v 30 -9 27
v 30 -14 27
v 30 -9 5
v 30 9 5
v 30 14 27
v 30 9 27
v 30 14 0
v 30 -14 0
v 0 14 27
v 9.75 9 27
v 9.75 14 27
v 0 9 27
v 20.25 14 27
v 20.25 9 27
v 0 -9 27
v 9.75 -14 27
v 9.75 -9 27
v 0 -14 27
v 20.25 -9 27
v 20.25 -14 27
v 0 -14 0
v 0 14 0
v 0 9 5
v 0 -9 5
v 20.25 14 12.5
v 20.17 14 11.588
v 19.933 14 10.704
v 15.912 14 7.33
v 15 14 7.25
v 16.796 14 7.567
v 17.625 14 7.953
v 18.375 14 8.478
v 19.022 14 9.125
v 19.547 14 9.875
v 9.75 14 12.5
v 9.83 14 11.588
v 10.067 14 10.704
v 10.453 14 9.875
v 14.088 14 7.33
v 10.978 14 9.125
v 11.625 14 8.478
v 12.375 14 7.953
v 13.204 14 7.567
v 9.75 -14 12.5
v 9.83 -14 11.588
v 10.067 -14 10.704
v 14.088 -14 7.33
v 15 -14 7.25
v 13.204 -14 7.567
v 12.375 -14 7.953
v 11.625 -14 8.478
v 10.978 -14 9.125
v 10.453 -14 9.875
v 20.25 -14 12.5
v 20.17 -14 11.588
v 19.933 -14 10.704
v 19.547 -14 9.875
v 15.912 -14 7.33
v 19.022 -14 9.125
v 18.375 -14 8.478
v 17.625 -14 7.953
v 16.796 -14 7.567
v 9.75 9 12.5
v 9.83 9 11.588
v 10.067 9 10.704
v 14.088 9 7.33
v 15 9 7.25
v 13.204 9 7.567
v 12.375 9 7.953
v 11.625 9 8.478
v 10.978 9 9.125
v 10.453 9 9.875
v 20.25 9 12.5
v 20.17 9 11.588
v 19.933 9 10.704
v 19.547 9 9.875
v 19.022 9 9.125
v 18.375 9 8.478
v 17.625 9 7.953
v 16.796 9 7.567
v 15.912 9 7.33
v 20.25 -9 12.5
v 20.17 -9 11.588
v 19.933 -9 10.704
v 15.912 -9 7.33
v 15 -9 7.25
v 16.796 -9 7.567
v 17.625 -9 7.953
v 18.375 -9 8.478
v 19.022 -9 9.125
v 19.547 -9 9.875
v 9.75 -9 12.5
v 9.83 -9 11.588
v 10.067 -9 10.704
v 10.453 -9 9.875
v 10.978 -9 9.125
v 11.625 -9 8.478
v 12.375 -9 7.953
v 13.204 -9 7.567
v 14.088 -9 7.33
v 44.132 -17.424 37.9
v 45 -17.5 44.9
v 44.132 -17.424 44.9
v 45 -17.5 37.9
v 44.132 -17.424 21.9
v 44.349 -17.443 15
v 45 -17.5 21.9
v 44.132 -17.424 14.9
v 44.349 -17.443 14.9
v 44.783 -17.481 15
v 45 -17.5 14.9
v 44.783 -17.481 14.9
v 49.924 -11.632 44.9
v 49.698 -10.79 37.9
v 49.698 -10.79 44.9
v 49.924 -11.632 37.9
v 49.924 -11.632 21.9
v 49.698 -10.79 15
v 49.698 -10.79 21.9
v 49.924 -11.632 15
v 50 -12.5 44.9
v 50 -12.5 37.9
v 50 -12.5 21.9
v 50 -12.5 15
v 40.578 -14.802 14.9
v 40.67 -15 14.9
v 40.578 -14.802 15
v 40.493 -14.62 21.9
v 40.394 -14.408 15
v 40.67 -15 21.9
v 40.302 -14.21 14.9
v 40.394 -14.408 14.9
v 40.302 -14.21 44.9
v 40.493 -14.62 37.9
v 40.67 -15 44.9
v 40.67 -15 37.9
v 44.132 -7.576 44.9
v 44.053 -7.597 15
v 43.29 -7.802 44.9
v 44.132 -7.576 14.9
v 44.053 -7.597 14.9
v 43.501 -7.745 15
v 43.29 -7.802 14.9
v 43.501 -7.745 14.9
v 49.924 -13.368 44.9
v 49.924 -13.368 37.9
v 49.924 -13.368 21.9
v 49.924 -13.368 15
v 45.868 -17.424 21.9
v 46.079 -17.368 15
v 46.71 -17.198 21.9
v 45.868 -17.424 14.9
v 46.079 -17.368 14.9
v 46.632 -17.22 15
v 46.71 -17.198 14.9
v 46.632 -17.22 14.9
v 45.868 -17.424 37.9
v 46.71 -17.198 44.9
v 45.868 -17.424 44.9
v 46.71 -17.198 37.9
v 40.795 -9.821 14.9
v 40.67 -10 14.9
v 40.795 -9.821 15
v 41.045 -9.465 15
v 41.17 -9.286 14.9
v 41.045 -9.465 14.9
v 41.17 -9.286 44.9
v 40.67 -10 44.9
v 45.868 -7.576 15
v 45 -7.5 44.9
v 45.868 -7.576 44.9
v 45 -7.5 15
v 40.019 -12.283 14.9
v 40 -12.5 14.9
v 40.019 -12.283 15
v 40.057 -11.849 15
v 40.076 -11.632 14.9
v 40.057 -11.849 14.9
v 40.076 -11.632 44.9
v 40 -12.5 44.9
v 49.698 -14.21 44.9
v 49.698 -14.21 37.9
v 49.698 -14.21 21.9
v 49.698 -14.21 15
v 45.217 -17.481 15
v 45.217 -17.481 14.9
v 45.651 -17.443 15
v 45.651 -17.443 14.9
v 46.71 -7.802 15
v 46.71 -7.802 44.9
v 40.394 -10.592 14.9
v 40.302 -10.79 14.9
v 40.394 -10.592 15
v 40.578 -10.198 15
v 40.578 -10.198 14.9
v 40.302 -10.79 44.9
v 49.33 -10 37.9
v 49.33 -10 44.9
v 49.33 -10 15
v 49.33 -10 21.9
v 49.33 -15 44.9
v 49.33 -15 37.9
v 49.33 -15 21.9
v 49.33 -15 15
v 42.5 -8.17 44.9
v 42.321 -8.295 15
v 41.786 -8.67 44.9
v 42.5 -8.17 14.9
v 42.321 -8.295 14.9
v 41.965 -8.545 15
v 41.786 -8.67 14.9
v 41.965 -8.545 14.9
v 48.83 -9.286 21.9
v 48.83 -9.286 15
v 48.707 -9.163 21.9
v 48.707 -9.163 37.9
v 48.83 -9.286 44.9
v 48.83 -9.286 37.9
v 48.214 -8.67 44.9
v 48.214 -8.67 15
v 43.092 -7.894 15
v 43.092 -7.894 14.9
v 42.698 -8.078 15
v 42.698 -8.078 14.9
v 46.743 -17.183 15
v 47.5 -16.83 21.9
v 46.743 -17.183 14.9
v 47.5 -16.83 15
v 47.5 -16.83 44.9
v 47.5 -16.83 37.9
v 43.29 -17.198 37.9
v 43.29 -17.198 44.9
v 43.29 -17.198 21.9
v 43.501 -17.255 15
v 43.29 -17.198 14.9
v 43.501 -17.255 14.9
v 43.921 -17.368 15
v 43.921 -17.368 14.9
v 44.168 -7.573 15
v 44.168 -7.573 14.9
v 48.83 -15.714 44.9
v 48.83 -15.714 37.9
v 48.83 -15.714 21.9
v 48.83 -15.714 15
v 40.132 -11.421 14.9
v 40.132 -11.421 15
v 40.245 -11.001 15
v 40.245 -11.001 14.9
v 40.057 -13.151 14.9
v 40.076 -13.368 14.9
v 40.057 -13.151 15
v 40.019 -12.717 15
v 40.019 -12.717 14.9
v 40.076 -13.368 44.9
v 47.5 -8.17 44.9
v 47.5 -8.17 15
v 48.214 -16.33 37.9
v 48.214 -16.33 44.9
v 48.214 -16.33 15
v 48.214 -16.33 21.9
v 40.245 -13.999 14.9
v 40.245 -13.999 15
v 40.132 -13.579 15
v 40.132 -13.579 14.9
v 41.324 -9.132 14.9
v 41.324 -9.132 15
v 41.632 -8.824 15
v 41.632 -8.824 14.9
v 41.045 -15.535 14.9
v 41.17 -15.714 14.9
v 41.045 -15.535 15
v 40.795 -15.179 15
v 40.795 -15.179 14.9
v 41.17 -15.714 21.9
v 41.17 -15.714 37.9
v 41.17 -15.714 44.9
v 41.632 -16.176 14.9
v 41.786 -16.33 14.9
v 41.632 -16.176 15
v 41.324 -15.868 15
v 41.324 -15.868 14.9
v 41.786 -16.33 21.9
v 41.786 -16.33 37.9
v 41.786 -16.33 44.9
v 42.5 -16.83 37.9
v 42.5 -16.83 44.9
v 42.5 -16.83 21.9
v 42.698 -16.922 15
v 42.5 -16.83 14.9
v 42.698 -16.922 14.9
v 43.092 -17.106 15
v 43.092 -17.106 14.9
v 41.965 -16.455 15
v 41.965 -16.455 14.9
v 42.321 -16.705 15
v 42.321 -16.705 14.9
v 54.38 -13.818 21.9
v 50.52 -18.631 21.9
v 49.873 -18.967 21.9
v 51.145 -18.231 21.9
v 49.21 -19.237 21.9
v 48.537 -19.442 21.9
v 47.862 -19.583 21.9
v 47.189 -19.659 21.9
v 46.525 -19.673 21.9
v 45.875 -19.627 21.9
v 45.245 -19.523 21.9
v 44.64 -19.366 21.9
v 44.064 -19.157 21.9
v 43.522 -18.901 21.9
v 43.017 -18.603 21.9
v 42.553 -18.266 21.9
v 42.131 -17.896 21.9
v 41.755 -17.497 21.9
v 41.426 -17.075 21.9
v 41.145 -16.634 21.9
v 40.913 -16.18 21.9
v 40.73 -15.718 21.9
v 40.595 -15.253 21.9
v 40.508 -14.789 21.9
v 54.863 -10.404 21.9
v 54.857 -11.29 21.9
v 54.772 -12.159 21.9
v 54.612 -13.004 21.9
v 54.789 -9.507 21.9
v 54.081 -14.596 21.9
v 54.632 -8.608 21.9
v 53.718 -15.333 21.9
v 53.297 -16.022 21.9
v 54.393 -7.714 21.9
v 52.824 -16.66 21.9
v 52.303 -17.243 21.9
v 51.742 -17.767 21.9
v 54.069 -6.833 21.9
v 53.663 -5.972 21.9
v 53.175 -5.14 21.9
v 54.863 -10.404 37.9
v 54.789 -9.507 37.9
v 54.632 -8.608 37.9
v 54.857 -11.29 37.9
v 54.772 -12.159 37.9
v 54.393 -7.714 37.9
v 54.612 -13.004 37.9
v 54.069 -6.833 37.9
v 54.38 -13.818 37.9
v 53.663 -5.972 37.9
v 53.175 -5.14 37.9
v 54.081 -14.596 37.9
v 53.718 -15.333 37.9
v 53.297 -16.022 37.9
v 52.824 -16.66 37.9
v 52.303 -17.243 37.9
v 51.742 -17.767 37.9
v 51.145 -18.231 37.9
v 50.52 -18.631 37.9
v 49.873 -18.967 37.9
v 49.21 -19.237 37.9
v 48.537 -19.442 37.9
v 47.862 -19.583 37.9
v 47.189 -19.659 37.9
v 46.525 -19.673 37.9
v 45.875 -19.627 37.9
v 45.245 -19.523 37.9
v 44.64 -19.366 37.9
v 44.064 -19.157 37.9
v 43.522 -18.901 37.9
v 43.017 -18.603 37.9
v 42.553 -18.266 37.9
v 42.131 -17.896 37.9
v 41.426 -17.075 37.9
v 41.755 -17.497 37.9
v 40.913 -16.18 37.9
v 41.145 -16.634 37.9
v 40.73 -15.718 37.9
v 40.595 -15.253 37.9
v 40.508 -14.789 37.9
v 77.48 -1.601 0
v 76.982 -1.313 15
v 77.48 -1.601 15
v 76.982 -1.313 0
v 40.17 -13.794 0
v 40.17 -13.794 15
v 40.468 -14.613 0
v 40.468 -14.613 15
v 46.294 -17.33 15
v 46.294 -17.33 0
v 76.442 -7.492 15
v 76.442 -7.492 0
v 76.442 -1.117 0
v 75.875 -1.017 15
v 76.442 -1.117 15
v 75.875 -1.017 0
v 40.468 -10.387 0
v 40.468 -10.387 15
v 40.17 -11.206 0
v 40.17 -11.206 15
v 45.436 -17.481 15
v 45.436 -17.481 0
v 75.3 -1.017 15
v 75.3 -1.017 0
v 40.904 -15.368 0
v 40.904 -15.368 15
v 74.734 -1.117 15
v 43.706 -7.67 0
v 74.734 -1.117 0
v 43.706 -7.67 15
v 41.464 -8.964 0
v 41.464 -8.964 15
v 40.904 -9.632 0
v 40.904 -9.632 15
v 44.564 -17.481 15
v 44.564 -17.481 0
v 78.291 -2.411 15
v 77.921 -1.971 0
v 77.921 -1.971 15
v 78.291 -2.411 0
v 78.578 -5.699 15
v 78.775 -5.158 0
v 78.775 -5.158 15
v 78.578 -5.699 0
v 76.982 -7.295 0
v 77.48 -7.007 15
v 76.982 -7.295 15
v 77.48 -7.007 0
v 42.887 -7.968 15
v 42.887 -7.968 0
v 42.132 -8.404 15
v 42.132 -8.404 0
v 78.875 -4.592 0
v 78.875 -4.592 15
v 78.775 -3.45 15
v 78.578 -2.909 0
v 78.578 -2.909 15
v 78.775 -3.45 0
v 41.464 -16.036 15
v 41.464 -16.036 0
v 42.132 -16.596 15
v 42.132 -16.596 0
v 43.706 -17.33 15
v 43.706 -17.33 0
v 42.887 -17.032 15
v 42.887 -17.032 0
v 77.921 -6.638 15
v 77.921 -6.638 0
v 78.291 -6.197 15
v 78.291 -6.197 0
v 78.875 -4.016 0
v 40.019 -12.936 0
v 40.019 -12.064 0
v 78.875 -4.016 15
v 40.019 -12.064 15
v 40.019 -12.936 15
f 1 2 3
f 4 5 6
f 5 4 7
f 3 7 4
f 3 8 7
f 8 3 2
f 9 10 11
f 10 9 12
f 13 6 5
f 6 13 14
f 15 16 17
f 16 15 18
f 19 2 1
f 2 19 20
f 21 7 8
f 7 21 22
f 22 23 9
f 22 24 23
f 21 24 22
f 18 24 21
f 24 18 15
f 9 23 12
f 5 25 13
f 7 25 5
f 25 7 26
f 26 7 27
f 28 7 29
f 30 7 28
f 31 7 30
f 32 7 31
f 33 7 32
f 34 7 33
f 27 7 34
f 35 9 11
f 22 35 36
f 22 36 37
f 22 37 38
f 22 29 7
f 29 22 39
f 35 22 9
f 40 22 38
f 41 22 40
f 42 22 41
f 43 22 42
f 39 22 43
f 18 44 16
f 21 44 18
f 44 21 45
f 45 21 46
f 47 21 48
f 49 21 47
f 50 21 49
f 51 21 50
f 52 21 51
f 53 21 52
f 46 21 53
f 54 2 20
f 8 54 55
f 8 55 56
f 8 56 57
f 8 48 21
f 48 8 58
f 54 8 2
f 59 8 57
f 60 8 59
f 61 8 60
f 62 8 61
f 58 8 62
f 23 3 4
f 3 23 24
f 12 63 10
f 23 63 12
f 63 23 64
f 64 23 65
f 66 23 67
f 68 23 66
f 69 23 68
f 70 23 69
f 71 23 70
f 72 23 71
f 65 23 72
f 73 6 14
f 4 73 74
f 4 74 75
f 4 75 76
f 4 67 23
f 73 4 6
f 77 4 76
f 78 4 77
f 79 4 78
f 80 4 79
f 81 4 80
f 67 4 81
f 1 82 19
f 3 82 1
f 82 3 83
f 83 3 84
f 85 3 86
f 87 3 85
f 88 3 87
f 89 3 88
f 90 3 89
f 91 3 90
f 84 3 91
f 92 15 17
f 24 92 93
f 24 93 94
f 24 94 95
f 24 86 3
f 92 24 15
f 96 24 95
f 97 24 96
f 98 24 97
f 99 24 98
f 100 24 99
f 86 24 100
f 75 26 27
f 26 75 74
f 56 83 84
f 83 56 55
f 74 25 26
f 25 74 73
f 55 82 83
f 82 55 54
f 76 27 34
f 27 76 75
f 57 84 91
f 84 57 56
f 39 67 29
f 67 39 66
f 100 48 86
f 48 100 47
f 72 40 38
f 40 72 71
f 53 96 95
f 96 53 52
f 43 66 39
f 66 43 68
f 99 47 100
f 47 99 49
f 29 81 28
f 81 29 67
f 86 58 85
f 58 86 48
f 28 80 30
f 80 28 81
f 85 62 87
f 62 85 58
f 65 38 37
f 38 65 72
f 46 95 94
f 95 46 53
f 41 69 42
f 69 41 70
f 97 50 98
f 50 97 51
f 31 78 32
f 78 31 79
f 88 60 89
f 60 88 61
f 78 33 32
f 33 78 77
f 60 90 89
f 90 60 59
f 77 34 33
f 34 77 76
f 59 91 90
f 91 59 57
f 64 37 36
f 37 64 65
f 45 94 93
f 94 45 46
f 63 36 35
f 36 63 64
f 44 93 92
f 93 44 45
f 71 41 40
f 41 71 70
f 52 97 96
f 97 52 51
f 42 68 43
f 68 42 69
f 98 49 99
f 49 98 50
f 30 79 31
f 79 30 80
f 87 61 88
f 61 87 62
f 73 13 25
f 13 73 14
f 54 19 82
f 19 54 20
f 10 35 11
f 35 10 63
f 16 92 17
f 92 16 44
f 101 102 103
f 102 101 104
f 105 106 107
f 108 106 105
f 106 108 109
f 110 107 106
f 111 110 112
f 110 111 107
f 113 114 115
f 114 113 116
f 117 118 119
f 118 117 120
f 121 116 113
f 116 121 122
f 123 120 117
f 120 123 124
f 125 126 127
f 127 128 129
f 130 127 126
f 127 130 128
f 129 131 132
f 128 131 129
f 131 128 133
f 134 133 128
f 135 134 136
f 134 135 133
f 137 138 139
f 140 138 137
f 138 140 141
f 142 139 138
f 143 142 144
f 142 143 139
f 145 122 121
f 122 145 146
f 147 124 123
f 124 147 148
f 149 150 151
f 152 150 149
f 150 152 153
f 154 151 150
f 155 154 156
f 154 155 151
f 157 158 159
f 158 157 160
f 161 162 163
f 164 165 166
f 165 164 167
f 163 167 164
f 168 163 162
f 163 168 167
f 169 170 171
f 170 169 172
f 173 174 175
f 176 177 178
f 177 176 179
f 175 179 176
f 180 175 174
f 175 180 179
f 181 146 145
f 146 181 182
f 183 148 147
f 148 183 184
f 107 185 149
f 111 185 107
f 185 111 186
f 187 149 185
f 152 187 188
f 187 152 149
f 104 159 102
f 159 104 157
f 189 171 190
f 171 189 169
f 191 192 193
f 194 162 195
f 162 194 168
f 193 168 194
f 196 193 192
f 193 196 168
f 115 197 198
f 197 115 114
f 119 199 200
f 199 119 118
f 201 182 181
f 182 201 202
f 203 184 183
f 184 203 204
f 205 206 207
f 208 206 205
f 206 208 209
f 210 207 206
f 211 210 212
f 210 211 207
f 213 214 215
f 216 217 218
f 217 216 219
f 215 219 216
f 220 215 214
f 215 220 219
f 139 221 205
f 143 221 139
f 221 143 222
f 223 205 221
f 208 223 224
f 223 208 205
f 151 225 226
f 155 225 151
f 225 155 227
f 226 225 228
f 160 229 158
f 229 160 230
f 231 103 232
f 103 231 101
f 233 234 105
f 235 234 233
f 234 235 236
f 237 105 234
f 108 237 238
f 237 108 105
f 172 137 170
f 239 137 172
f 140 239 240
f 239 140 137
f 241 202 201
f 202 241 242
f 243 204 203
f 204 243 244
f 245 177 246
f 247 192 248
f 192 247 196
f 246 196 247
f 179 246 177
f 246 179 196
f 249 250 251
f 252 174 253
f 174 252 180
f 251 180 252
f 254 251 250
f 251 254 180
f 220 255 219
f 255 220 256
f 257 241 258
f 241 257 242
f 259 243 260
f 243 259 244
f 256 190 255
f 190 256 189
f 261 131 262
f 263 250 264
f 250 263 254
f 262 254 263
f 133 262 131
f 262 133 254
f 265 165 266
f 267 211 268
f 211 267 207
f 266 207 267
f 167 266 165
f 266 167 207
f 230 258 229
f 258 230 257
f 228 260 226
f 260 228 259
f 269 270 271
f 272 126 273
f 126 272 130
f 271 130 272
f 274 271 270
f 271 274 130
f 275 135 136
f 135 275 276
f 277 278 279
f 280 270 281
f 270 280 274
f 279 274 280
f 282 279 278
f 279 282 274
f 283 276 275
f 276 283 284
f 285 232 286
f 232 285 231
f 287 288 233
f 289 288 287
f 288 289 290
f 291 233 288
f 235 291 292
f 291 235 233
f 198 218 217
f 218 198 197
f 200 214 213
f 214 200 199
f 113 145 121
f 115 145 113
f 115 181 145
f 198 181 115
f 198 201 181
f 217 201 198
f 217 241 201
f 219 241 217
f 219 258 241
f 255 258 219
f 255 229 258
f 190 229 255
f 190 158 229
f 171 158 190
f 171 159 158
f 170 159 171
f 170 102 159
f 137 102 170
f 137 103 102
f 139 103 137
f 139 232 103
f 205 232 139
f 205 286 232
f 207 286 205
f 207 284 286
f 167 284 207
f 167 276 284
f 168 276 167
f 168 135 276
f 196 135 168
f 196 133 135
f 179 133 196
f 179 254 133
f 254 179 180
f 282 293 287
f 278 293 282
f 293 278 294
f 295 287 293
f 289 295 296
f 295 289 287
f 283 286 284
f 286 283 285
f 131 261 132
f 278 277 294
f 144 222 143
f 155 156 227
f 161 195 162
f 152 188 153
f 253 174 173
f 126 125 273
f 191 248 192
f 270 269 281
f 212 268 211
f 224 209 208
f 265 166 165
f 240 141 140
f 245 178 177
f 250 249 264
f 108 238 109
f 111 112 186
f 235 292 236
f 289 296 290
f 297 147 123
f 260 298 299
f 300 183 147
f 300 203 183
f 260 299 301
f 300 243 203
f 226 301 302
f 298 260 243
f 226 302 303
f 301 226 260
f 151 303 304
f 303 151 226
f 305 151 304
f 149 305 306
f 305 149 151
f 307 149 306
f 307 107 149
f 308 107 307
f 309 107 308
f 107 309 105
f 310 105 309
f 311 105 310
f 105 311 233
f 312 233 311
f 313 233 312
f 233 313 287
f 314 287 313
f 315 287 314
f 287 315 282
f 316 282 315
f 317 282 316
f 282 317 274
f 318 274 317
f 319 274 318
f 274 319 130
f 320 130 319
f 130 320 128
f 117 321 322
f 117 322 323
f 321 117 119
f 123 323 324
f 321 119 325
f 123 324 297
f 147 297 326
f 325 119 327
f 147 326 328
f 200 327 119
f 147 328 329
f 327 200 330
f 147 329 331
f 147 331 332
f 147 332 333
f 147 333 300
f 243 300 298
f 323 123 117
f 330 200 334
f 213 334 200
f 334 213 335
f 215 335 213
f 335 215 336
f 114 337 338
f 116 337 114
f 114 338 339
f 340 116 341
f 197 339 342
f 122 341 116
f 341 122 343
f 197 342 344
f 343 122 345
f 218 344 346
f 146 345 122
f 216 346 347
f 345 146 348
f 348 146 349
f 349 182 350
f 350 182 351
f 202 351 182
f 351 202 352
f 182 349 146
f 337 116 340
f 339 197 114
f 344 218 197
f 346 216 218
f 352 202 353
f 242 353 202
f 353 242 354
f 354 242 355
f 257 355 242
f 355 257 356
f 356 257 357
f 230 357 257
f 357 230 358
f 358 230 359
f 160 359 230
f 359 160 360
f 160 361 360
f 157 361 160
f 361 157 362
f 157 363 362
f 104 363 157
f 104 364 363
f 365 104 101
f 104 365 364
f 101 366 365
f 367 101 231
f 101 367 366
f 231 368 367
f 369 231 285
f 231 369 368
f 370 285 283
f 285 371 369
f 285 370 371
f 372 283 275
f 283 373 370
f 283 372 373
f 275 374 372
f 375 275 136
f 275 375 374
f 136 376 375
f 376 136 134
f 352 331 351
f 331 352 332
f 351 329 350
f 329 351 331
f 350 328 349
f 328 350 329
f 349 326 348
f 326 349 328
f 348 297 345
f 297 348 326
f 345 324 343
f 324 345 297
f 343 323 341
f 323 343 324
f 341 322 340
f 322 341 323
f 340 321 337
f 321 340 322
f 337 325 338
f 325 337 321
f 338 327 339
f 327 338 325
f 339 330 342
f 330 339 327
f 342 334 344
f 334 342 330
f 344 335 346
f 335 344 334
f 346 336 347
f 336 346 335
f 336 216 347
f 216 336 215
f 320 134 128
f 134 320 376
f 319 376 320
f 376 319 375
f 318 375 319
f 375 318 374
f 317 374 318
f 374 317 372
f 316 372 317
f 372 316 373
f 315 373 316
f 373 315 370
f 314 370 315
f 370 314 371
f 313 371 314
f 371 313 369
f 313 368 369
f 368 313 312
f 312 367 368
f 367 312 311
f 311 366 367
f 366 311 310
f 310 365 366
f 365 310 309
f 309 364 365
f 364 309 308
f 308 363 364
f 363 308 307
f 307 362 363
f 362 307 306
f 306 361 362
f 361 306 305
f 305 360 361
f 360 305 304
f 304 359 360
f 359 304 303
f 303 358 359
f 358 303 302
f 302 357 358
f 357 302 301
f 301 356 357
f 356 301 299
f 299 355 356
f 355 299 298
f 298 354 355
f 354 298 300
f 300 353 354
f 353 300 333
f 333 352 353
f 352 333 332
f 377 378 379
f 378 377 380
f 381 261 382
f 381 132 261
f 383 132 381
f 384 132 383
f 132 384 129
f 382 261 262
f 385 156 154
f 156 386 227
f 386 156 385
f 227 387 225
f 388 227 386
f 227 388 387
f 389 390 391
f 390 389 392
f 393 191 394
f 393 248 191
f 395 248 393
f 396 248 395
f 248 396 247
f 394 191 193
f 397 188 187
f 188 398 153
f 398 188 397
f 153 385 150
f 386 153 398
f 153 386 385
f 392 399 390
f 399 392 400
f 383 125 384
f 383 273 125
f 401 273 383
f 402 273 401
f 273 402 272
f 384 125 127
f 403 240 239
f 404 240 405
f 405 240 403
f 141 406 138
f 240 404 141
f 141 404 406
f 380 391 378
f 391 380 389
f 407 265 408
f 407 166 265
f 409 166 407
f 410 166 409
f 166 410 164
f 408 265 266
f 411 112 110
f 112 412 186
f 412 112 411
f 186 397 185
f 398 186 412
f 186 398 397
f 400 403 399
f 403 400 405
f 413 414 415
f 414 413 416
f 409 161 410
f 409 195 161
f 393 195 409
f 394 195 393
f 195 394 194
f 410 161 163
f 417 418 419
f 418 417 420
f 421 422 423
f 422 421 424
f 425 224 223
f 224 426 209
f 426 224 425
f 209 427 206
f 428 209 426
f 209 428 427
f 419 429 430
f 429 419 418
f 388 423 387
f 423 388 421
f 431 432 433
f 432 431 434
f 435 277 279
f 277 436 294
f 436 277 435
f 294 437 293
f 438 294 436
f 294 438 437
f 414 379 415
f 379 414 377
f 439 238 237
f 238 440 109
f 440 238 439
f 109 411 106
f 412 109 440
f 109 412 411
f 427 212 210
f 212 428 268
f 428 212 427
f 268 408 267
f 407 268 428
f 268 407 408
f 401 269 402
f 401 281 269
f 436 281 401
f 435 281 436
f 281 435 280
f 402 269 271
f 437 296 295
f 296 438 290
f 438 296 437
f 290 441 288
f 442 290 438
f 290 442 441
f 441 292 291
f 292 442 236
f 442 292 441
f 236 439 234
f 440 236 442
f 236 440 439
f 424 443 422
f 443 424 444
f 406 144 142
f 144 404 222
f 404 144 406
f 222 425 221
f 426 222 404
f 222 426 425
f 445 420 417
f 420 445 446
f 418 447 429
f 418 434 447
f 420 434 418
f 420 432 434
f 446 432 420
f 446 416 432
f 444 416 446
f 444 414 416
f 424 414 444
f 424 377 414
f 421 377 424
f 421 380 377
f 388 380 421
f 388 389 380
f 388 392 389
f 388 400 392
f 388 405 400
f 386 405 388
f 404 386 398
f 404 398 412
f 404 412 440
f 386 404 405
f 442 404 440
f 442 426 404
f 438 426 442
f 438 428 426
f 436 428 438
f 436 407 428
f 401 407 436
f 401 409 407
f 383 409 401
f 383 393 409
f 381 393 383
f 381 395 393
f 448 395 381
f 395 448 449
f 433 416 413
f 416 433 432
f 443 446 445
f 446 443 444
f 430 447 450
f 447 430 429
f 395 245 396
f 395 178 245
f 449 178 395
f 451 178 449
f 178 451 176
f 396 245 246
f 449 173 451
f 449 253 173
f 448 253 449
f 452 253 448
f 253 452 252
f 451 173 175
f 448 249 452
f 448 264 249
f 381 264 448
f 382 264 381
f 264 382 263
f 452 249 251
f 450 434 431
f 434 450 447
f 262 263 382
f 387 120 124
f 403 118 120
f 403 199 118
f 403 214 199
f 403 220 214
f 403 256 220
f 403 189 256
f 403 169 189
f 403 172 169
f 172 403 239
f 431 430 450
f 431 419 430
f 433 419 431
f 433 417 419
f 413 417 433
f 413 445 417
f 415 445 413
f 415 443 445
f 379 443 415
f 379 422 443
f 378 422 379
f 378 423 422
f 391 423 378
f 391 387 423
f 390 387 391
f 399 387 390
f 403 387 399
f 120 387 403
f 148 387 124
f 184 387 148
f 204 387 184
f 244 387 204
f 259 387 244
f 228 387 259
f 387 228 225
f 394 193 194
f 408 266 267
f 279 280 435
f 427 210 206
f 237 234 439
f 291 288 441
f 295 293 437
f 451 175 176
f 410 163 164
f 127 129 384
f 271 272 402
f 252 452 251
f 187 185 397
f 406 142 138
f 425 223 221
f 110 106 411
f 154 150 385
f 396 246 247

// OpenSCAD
// a window stopper with a rotating wedge
// (all sizes in millimeter)

module window_stopper(
    window_thickness,         // thickness of window frame
    windowsill_dist,          // distance between window and windowsill
    windowsill_adj     = 0,   // adjustment for windowsill distance
    stopper_width      = 30,  // width of the stopper
    material_thickness = 5,   // material thickness of the stopper
    window_overlap     = 7,   // overlap of stopper and window
    axle_dm            = 10,  // axle diameter
    axle_clearance     = 0.5, // axle clearance towards bushing
    wedge_start_r      = 0,   // wedge start radius
    wedge_end_r        = 11,  // wedge end radius
    wedge_angle        = 42,  // start angle of wedge
    lever_depth        = 15,  // depth of lever
    lever_length       = 40,  // length of lever
    lever_angle        = 15,  // start angle of lever
    print_version      = false  
) {

    $fn = 36;
    axle_height = 
        material_thickness + (windowsill_dist - material_thickness) / 2;

    module window() {
        color("LightSkyBlue")
        translate( [-20, -window_thickness / 2, windowsill_dist] )
        cube( [100, window_thickness, 0.1] );
    }

    module stopper_case() {
    	case_size = [
    		stopper_width,                              
    		window_thickness + 2 * material_thickness,  
    		windowsill_dist + window_overlap    
    	];
        
        translate( [0, -case_size.y / 2, 0] ) 
        difference() {
            cube( case_size );
            
            translate( [-1, material_thickness, material_thickness] )
            cube( [case_size.x + 2, window_thickness, case_size.z] );
            
            axle_bushing = axle_dm + axle_clearance;
            
            translate( [case_size.x / 2, -1, axle_height] )
            rotate( [-90, 0, 0] )
            cylinder( d = axle_bushing, h = case_size.y + 2);
            
            translate( [(case_size.x - axle_bushing) / 2, -1, axle_height] )
            cube( [axle_bushing, case_size.y + 2, case_size.z] );
        }
        
        translate( [0, -case_size.y / 2, -windowsill_adj] )
        cube( [case_size.x, case_size.y, windowsill_adj] );
    }

    module stopper( angle = 0 ) {
        axle_length = window_thickness + 2 * material_thickness + 2;
        
        translate( [stopper_width / 2, -axle_length / 2, axle_height] )
        rotate( [-90, 0, 0] )
        cylinder( d = axle_dm, h = axle_length );
        
        points = [
            for (i = [0:5:360]) 
            let (radius = wedge_start_r + (wedge_end_r - wedge_start_r) * i / 360 ) 
            [ cos( i ) * radius, sin( i ) * radius ] 
        ];

        wedge_width = window_thickness - 2;
        
        translate( [stopper_width / 2, -wedge_width / 2, axle_height] )
        rotate( [-90, 0, 0] ) 
        rotate( [0, 0, wedge_angle + angle] )
        linear_extrude( height = wedge_width )  
        polygon(points);
            
        translate( [stopper_width / 2, -axle_length / 2 + 0.1, axle_height] )
        rotate( [0, lever_angle + angle, 0] )
        rotate( [90, 0, 0] )
        linear_extrude( height = lever_depth )
        hull() {
            circle( d = axle_dm );
            translate( [lever_length - axle_dm / 2 - axle_dm / 3, 0, 0] )
            circle( d = axle_dm * 0.66 );
        }        
    }
    
    if (print_version) {
        stopper_case();
        
        translate([
            stopper_width, 
            0, 
            (window_thickness + 2 * material_thickness + 2) / 2 + 
                lever_depth - 0.1
        ])
        rotate( [90, 0, 0] )
        stopper();
    } else {
        window();    
        stopper_case();    
        stopper( - 100);
    }

}

window_stopper(
    window_thickness = 18, 
    windowsill_dist  = 20,
    print_version    = true
);
